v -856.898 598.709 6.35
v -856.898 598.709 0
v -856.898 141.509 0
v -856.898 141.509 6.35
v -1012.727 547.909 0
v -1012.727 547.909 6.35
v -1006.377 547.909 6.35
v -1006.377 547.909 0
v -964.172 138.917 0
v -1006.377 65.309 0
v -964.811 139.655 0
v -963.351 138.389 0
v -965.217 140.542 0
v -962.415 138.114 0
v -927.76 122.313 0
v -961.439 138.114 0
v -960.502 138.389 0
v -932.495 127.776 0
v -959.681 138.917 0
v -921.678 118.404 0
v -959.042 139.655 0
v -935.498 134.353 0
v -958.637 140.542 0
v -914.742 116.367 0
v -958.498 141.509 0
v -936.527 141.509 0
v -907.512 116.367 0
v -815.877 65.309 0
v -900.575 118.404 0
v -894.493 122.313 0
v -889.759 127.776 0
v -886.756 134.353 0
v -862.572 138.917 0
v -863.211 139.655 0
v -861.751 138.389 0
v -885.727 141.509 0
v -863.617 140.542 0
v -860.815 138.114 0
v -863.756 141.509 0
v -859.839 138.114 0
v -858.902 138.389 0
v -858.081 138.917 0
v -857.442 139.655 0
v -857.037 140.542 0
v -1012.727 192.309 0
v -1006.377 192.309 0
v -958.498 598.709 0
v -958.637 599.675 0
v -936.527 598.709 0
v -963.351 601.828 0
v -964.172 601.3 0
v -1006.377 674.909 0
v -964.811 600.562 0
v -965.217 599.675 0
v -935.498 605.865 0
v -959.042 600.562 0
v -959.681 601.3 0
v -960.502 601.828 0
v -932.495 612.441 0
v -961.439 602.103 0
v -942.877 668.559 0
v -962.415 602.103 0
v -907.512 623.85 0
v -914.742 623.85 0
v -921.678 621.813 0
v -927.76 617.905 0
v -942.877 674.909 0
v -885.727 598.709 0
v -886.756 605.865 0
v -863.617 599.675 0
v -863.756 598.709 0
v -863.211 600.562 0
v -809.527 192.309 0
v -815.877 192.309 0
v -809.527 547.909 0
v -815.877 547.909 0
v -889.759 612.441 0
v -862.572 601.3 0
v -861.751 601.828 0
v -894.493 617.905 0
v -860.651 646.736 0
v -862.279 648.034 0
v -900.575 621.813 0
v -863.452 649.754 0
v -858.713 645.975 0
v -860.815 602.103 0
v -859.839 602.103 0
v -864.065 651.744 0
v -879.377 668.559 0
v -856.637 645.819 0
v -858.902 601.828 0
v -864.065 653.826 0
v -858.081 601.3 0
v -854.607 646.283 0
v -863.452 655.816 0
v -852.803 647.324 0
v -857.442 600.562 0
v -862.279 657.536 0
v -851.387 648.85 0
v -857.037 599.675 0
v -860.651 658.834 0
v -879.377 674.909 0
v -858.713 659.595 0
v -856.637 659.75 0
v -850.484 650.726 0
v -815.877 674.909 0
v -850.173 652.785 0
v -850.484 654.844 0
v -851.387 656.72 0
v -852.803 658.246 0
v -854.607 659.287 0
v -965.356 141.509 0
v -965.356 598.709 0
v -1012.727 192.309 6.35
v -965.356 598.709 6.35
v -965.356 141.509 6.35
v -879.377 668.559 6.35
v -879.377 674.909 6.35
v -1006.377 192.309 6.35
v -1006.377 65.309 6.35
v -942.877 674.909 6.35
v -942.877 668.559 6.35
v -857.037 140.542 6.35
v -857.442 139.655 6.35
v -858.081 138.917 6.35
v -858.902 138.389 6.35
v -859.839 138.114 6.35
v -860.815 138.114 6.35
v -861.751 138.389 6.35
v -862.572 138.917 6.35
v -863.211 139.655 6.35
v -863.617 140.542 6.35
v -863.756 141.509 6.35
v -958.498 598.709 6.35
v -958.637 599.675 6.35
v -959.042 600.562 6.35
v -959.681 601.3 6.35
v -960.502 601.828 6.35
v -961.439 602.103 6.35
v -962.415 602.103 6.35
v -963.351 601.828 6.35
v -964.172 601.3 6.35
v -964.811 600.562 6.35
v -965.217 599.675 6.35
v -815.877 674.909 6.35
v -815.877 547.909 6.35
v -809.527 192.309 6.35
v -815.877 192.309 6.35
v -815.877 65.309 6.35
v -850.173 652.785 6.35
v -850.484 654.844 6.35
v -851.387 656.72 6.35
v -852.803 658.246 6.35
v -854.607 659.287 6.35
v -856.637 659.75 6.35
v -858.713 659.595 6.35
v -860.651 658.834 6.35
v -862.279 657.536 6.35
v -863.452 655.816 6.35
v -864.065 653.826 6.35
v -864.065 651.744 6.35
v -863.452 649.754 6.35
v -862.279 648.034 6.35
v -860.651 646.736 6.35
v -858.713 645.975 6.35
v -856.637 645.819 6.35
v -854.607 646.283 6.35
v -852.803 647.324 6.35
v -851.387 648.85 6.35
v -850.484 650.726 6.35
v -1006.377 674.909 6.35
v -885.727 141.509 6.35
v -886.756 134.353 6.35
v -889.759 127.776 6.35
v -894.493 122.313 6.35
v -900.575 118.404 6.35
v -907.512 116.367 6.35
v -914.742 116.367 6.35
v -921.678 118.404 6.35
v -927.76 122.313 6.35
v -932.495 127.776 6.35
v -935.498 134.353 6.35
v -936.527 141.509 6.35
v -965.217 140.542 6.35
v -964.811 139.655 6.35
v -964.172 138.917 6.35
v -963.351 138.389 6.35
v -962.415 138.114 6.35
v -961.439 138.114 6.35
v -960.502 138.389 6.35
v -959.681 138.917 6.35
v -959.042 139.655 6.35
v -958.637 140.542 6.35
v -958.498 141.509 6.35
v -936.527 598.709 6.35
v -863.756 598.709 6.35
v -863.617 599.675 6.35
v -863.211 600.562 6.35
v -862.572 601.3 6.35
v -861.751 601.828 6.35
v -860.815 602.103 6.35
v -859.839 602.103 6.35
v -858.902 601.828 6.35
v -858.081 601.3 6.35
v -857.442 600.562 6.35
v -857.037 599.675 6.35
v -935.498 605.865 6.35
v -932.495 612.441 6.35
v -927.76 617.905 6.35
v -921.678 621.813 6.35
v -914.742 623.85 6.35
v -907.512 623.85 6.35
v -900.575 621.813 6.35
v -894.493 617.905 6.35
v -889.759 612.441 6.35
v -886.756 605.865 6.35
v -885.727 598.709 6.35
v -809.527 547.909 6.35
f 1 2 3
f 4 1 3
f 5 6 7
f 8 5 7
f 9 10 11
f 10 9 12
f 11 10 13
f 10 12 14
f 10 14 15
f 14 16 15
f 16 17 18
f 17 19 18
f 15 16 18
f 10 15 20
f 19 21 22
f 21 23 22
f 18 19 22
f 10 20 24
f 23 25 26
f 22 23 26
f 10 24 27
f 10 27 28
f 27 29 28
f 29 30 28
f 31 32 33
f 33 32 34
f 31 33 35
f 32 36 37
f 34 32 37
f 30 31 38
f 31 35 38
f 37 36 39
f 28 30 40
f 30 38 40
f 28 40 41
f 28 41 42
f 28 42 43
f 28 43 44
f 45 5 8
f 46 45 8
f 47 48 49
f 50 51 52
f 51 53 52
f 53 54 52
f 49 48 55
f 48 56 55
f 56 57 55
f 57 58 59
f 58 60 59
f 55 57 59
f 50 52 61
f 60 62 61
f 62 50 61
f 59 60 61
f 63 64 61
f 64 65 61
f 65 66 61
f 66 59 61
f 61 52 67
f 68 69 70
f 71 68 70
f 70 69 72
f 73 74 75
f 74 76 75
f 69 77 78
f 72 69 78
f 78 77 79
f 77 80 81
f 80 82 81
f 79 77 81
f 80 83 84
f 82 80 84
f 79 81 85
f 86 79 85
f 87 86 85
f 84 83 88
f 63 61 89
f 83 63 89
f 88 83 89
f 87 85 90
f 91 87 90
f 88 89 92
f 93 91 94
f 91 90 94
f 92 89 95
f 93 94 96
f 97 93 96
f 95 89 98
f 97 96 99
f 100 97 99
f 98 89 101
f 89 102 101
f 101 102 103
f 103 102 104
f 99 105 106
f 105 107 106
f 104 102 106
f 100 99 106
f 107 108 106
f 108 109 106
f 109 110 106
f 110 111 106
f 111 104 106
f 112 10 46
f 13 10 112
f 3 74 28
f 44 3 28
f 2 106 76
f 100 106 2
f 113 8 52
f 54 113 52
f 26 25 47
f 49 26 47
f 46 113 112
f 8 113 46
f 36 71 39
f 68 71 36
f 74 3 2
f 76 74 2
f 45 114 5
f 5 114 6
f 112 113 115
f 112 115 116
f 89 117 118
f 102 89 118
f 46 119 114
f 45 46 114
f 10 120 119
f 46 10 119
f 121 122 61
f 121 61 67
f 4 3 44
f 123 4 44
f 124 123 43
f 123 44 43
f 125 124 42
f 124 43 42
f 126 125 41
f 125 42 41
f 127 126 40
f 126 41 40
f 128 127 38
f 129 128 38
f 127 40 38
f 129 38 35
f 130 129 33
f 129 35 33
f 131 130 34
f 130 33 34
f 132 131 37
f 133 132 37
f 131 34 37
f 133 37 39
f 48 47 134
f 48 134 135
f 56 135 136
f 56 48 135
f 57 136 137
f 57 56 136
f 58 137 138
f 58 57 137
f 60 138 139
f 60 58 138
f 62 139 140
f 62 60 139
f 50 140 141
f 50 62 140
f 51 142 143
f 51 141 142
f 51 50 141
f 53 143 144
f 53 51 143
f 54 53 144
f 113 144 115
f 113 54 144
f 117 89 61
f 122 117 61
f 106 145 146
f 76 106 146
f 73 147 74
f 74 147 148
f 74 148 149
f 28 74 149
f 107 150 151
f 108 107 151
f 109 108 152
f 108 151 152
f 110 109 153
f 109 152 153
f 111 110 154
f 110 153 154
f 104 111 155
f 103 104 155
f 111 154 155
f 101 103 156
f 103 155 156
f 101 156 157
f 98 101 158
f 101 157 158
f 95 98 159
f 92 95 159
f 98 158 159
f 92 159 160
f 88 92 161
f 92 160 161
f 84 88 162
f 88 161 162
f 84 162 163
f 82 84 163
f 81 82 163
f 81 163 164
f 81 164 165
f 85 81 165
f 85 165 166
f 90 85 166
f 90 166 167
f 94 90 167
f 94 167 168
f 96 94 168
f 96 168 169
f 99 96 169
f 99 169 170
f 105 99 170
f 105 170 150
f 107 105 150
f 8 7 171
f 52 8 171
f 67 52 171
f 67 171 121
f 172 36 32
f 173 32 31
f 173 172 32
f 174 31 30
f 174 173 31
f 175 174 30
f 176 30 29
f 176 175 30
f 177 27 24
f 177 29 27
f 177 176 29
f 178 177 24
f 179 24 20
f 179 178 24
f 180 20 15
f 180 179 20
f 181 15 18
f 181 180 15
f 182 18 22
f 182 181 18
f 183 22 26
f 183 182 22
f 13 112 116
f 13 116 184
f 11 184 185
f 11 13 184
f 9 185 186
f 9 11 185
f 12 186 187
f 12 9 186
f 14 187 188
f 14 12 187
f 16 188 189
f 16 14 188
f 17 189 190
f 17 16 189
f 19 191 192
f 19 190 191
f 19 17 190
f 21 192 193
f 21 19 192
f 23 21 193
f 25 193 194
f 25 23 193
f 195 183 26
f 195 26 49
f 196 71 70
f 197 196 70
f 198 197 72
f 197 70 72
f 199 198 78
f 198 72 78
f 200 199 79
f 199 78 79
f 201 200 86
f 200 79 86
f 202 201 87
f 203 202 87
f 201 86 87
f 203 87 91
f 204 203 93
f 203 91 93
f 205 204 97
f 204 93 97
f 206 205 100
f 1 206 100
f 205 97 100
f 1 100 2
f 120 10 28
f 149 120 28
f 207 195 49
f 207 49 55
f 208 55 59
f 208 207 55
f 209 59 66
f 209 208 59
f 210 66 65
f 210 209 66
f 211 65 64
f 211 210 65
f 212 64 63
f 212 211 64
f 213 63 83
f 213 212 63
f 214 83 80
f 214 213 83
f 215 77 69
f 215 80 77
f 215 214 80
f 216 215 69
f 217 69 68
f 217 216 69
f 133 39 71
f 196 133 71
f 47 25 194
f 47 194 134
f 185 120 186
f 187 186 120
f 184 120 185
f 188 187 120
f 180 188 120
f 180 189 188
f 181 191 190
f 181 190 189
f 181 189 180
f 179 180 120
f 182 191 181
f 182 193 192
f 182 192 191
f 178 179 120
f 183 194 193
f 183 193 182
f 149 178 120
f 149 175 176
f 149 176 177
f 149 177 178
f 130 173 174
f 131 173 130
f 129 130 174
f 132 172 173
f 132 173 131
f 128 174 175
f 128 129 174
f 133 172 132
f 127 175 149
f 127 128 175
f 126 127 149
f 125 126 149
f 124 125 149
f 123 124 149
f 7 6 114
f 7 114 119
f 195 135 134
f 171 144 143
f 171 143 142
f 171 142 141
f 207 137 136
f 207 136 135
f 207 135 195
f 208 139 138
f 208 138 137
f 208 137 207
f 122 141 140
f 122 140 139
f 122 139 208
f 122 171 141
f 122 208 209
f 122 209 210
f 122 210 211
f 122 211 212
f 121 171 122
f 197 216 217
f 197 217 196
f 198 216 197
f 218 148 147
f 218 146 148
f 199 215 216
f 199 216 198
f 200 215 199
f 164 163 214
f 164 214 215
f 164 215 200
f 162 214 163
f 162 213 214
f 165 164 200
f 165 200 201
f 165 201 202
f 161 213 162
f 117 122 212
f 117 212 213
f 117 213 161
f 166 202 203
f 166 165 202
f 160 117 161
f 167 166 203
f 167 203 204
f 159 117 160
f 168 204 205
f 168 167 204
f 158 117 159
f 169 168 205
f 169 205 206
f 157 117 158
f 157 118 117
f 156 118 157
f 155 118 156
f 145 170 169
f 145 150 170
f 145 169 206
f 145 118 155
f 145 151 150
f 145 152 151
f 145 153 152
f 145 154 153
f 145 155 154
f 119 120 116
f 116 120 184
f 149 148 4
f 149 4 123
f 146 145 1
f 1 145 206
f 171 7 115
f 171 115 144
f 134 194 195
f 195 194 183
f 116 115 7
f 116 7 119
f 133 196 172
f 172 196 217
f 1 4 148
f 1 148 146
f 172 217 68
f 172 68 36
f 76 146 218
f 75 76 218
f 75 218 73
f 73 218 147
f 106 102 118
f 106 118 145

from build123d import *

# Parameters (mm, degrees)
SKETCH2_W                = 215.9
SKETCH2_H                = 609.6
BOSS_EXTRUDE1_DEPTH      = 6.35
CUT_EXTRUDE1_DEPTH       = 7.35
CUT_EXTRUDE2_DEPTH       = 1
CUT_EXTRUDE2_DEPTH_BACK  = 7.35
CUT_EXTRUDE3_DEPTH       = 1
CUT_EXTRUDE3_DEPTH_BACK  = 7.35
CUT_EXTRUDE6_DEPTH       = 1
CUT_EXTRUDE6_DEPTH_BACK  = 7.35
CUT_EXTRUDE7_DEPTH       = 1
CUT_EXTRUDE7_DEPTH_BACK  = 7.35
CUT_EXTRUDE11_DEPTH      = 1
CUT_EXTRUDE11_DEPTH_BACK = 7.35
CUT_EXTRUDE13_DEPTH      = 1
CUT_EXTRUDE13_DEPTH_BACK = 7.35
SKETCH13_W               = 63.5
SKETCH13_H               = 6.35
CUT_EXTRUDE14_DEPTH      = 1
CUT_EXTRUDE14_DEPTH_BACK = 7.35
CUT_EXTRUDE19_DEPTH      = 7.35
SKETCH26_R               = 6.985
CUT_EXTRUDE20_DEPTH      = 7.35


with BuildPart() as part:
    # Sketch2 → Boss-Extrude1 (new body)
    with BuildSketch(Plane.XY):
        with Locations((-911.126767395, 370.108550968)):
            Rectangle(SKETCH2_W, SKETCH2_H)
    extrude(amount=BOSS_EXTRUDE1_DEPTH)

    # Sketch3 → Cut-Extrude1 (cut, through all)
    with BuildSketch(Plane.XY.offset(6.35)):
        with BuildLine():
            Line((-936.526767395, 141.508550968), (-936.526767395, 598.708550968))
            ThreePointArc((-936.526767395, 598.708550968), (-911.126767395, 624.108550968), (-885.726767395, 598.708550968))
            Line((-885.726767395, 598.708550968), (-885.726767395, 141.508550968))
            ThreePointArc((-885.726767395, 141.508550968), (-911.126767395, 116.108550968), (-936.526767395, 141.508550968))
        make_face()
    extrude(amount=-CUT_EXTRUDE1_DEPTH, mode=Mode.SUBTRACT)

    # Sketch4 → Cut-Extrude2 (cut, two sides)
    with BuildSketch(Plane.XY.offset(6.35)) as cut_extrude2_sk:
        Polygon((-815.876767395, 1970.05819206), (-815.876767395, 674.908550968), (-815.876767395, 547.908550968), (-803.176767395, 547.908550968), (491.972873698, 547.908550968), (2398.607136056, 2301.304159748), (1090.757494964, 3723.45380084), align=None)
    extrude(amount=CUT_EXTRUDE2_DEPTH, mode=Mode.SUBTRACT)
    extrude(cut_extrude2_sk.sketch, amount=-CUT_EXTRUDE2_DEPTH_BACK, mode=Mode.SUBTRACT)

    # Sketch5 → Cut-Extrude3 (cut, two sides)
    with BuildSketch(Plane.XY.offset(6.35)) as cut_extrude3_sk:
        Polygon((-815.876767395, -1229.841090125), (-815.876767395, 65.308550968), (-815.876767395, 192.308550968), (-803.176767395, 192.308550968), (491.972873698, 192.308550968), (2398.607136056, -1561.087057812), (1090.757494964, -2983.236698905), align=None)
    extrude(amount=CUT_EXTRUDE3_DEPTH, mode=Mode.SUBTRACT)
    extrude(cut_extrude3_sk.sketch, amount=-CUT_EXTRUDE3_DEPTH_BACK, mode=Mode.SUBTRACT)

    # Sketch6 → Cut-Extrude6 (cut, two sides)
    with BuildSketch(Plane.XY.offset(6.35)) as cut_extrude6_sk:
        Polygon((-1006.376767395, 1970.05819206), (-1006.376767395, 674.908550968), (-1006.376767395, 547.908550968), (-1019.076767395, 547.908550968), (-2314.226408487, 547.908550968), (-4220.860670845, 2301.304159748), (-2913.011029753, 3723.45380084), align=None)
    extrude(amount=CUT_EXTRUDE6_DEPTH, mode=Mode.SUBTRACT)
    extrude(cut_extrude6_sk.sketch, amount=-CUT_EXTRUDE6_DEPTH_BACK, mode=Mode.SUBTRACT)

    # Sketch9 → Cut-Extrude7 (cut, two sides)
    with BuildSketch(Plane.XY.offset(6.35)) as cut_extrude7_sk:
        Polygon((-1006.376767395, -1229.841090125), (-1006.376767395, 65.308550968), (-1006.376767395, 192.308550968), (-1019.076767395, 192.308550968), (-2314.226408487, 192.308550968), (-4220.860670845, -1561.087057812), (-2913.011029753, -2983.236698905), align=None)
    extrude(amount=CUT_EXTRUDE7_DEPTH, mode=Mode.SUBTRACT)
    extrude(cut_extrude7_sk.sketch, amount=-CUT_EXTRUDE7_DEPTH_BACK, mode=Mode.SUBTRACT)

    # Sketch16 → Cut-Extrude11 (cut, two sides)
    with BuildSketch(Plane.XY.offset(6.35)) as cut_extrude11_sk:
        Polygon((-1012.726767395, -869.953702465), (-1012.726767395, 192.308550968), (-1012.726767395, 547.908550968), (-1012.726767395, 1610.170804401), (-3137.251274261, 1610.170804401), (-3137.251274261, -869.953702465), align=None)
    extrude(amount=CUT_EXTRUDE11_DEPTH, mode=Mode.SUBTRACT)
    extrude(cut_extrude11_sk.sketch, amount=-CUT_EXTRUDE11_DEPTH_BACK, mode=Mode.SUBTRACT)

    # Sketch17 → Cut-Extrude13 (cut, two sides)
    with BuildSketch(Plane.XY.offset(6.35)) as cut_extrude13_sk:
        Polygon((-809.526767395, -864.960277939), (-809.526767395, 192.308550968), (-809.526767395, 547.908550968), (-809.526767395, 1605.177379875), (1305.010890419, 1605.177379875), (1305.010890419, -864.960277939), align=None)
    extrude(amount=CUT_EXTRUDE13_DEPTH, mode=Mode.SUBTRACT)
    extrude(cut_extrude13_sk.sketch, amount=-CUT_EXTRUDE13_DEPTH_BACK, mode=Mode.SUBTRACT)

    # Sketch13 → Cut-Extrude14 (cut, two sides)
    with BuildSketch(Plane(origin=(0, 0, 0), x_dir=(-1, 0, 0), z_dir=(0, 0, -1))) as cut_extrude14_sk:
        with Locations((911.126767395, 671.733550968)):
            Rectangle(SKETCH13_W, SKETCH13_H)
    extrude(amount=CUT_EXTRUDE14_DEPTH, mode=Mode.SUBTRACT)
    extrude(cut_extrude14_sk.sketch, amount=-CUT_EXTRUDE14_DEPTH_BACK, mode=Mode.SUBTRACT)

    # Sketch25 → Cut-Extrude19 (cut, through all)
    with BuildSketch(Plane(origin=(0, 0, 0), x_dir=(-1, 0, 0), z_dir=(0, 0, -1))):
        with BuildLine():
            Line((958.497767395, 141.508550968), (958.497767395, 598.708550968))
            ThreePointArc((958.497767395, 598.708550968), (961.926767395, 602.137550968), (965.355767395, 598.708550968))
            Line((965.355767395, 598.708550968), (965.355767395, 141.508550968))
            ThreePointArc((965.355767395, 141.508550968), (961.926767395, 138.079550968), (958.497767395, 141.508550968))
        make_face()
    cut_extrude19 = extrude(amount=-CUT_EXTRUDE19_DEPTH, mode=Mode.SUBTRACT)

    # Mirror1: Cut-Extrude19 across plane
    add(cut_extrude19.mirror(Plane(origin=(-911.126767395, 0, 0), x_dir=(0, 0, 1), z_dir=(1, 0, 0))), mode=Mode.SUBTRACT)

    # Sketch26 → Cut-Extrude20 (cut, through all)
    with BuildSketch(Plane.XY.offset(6.35)):
        with Locations((-857.158491521, 652.784891731)):
            Circle(SKETCH26_R)
    extrude(amount=-CUT_EXTRUDE20_DEPTH, mode=Mode.SUBTRACT)


solid = part.part
